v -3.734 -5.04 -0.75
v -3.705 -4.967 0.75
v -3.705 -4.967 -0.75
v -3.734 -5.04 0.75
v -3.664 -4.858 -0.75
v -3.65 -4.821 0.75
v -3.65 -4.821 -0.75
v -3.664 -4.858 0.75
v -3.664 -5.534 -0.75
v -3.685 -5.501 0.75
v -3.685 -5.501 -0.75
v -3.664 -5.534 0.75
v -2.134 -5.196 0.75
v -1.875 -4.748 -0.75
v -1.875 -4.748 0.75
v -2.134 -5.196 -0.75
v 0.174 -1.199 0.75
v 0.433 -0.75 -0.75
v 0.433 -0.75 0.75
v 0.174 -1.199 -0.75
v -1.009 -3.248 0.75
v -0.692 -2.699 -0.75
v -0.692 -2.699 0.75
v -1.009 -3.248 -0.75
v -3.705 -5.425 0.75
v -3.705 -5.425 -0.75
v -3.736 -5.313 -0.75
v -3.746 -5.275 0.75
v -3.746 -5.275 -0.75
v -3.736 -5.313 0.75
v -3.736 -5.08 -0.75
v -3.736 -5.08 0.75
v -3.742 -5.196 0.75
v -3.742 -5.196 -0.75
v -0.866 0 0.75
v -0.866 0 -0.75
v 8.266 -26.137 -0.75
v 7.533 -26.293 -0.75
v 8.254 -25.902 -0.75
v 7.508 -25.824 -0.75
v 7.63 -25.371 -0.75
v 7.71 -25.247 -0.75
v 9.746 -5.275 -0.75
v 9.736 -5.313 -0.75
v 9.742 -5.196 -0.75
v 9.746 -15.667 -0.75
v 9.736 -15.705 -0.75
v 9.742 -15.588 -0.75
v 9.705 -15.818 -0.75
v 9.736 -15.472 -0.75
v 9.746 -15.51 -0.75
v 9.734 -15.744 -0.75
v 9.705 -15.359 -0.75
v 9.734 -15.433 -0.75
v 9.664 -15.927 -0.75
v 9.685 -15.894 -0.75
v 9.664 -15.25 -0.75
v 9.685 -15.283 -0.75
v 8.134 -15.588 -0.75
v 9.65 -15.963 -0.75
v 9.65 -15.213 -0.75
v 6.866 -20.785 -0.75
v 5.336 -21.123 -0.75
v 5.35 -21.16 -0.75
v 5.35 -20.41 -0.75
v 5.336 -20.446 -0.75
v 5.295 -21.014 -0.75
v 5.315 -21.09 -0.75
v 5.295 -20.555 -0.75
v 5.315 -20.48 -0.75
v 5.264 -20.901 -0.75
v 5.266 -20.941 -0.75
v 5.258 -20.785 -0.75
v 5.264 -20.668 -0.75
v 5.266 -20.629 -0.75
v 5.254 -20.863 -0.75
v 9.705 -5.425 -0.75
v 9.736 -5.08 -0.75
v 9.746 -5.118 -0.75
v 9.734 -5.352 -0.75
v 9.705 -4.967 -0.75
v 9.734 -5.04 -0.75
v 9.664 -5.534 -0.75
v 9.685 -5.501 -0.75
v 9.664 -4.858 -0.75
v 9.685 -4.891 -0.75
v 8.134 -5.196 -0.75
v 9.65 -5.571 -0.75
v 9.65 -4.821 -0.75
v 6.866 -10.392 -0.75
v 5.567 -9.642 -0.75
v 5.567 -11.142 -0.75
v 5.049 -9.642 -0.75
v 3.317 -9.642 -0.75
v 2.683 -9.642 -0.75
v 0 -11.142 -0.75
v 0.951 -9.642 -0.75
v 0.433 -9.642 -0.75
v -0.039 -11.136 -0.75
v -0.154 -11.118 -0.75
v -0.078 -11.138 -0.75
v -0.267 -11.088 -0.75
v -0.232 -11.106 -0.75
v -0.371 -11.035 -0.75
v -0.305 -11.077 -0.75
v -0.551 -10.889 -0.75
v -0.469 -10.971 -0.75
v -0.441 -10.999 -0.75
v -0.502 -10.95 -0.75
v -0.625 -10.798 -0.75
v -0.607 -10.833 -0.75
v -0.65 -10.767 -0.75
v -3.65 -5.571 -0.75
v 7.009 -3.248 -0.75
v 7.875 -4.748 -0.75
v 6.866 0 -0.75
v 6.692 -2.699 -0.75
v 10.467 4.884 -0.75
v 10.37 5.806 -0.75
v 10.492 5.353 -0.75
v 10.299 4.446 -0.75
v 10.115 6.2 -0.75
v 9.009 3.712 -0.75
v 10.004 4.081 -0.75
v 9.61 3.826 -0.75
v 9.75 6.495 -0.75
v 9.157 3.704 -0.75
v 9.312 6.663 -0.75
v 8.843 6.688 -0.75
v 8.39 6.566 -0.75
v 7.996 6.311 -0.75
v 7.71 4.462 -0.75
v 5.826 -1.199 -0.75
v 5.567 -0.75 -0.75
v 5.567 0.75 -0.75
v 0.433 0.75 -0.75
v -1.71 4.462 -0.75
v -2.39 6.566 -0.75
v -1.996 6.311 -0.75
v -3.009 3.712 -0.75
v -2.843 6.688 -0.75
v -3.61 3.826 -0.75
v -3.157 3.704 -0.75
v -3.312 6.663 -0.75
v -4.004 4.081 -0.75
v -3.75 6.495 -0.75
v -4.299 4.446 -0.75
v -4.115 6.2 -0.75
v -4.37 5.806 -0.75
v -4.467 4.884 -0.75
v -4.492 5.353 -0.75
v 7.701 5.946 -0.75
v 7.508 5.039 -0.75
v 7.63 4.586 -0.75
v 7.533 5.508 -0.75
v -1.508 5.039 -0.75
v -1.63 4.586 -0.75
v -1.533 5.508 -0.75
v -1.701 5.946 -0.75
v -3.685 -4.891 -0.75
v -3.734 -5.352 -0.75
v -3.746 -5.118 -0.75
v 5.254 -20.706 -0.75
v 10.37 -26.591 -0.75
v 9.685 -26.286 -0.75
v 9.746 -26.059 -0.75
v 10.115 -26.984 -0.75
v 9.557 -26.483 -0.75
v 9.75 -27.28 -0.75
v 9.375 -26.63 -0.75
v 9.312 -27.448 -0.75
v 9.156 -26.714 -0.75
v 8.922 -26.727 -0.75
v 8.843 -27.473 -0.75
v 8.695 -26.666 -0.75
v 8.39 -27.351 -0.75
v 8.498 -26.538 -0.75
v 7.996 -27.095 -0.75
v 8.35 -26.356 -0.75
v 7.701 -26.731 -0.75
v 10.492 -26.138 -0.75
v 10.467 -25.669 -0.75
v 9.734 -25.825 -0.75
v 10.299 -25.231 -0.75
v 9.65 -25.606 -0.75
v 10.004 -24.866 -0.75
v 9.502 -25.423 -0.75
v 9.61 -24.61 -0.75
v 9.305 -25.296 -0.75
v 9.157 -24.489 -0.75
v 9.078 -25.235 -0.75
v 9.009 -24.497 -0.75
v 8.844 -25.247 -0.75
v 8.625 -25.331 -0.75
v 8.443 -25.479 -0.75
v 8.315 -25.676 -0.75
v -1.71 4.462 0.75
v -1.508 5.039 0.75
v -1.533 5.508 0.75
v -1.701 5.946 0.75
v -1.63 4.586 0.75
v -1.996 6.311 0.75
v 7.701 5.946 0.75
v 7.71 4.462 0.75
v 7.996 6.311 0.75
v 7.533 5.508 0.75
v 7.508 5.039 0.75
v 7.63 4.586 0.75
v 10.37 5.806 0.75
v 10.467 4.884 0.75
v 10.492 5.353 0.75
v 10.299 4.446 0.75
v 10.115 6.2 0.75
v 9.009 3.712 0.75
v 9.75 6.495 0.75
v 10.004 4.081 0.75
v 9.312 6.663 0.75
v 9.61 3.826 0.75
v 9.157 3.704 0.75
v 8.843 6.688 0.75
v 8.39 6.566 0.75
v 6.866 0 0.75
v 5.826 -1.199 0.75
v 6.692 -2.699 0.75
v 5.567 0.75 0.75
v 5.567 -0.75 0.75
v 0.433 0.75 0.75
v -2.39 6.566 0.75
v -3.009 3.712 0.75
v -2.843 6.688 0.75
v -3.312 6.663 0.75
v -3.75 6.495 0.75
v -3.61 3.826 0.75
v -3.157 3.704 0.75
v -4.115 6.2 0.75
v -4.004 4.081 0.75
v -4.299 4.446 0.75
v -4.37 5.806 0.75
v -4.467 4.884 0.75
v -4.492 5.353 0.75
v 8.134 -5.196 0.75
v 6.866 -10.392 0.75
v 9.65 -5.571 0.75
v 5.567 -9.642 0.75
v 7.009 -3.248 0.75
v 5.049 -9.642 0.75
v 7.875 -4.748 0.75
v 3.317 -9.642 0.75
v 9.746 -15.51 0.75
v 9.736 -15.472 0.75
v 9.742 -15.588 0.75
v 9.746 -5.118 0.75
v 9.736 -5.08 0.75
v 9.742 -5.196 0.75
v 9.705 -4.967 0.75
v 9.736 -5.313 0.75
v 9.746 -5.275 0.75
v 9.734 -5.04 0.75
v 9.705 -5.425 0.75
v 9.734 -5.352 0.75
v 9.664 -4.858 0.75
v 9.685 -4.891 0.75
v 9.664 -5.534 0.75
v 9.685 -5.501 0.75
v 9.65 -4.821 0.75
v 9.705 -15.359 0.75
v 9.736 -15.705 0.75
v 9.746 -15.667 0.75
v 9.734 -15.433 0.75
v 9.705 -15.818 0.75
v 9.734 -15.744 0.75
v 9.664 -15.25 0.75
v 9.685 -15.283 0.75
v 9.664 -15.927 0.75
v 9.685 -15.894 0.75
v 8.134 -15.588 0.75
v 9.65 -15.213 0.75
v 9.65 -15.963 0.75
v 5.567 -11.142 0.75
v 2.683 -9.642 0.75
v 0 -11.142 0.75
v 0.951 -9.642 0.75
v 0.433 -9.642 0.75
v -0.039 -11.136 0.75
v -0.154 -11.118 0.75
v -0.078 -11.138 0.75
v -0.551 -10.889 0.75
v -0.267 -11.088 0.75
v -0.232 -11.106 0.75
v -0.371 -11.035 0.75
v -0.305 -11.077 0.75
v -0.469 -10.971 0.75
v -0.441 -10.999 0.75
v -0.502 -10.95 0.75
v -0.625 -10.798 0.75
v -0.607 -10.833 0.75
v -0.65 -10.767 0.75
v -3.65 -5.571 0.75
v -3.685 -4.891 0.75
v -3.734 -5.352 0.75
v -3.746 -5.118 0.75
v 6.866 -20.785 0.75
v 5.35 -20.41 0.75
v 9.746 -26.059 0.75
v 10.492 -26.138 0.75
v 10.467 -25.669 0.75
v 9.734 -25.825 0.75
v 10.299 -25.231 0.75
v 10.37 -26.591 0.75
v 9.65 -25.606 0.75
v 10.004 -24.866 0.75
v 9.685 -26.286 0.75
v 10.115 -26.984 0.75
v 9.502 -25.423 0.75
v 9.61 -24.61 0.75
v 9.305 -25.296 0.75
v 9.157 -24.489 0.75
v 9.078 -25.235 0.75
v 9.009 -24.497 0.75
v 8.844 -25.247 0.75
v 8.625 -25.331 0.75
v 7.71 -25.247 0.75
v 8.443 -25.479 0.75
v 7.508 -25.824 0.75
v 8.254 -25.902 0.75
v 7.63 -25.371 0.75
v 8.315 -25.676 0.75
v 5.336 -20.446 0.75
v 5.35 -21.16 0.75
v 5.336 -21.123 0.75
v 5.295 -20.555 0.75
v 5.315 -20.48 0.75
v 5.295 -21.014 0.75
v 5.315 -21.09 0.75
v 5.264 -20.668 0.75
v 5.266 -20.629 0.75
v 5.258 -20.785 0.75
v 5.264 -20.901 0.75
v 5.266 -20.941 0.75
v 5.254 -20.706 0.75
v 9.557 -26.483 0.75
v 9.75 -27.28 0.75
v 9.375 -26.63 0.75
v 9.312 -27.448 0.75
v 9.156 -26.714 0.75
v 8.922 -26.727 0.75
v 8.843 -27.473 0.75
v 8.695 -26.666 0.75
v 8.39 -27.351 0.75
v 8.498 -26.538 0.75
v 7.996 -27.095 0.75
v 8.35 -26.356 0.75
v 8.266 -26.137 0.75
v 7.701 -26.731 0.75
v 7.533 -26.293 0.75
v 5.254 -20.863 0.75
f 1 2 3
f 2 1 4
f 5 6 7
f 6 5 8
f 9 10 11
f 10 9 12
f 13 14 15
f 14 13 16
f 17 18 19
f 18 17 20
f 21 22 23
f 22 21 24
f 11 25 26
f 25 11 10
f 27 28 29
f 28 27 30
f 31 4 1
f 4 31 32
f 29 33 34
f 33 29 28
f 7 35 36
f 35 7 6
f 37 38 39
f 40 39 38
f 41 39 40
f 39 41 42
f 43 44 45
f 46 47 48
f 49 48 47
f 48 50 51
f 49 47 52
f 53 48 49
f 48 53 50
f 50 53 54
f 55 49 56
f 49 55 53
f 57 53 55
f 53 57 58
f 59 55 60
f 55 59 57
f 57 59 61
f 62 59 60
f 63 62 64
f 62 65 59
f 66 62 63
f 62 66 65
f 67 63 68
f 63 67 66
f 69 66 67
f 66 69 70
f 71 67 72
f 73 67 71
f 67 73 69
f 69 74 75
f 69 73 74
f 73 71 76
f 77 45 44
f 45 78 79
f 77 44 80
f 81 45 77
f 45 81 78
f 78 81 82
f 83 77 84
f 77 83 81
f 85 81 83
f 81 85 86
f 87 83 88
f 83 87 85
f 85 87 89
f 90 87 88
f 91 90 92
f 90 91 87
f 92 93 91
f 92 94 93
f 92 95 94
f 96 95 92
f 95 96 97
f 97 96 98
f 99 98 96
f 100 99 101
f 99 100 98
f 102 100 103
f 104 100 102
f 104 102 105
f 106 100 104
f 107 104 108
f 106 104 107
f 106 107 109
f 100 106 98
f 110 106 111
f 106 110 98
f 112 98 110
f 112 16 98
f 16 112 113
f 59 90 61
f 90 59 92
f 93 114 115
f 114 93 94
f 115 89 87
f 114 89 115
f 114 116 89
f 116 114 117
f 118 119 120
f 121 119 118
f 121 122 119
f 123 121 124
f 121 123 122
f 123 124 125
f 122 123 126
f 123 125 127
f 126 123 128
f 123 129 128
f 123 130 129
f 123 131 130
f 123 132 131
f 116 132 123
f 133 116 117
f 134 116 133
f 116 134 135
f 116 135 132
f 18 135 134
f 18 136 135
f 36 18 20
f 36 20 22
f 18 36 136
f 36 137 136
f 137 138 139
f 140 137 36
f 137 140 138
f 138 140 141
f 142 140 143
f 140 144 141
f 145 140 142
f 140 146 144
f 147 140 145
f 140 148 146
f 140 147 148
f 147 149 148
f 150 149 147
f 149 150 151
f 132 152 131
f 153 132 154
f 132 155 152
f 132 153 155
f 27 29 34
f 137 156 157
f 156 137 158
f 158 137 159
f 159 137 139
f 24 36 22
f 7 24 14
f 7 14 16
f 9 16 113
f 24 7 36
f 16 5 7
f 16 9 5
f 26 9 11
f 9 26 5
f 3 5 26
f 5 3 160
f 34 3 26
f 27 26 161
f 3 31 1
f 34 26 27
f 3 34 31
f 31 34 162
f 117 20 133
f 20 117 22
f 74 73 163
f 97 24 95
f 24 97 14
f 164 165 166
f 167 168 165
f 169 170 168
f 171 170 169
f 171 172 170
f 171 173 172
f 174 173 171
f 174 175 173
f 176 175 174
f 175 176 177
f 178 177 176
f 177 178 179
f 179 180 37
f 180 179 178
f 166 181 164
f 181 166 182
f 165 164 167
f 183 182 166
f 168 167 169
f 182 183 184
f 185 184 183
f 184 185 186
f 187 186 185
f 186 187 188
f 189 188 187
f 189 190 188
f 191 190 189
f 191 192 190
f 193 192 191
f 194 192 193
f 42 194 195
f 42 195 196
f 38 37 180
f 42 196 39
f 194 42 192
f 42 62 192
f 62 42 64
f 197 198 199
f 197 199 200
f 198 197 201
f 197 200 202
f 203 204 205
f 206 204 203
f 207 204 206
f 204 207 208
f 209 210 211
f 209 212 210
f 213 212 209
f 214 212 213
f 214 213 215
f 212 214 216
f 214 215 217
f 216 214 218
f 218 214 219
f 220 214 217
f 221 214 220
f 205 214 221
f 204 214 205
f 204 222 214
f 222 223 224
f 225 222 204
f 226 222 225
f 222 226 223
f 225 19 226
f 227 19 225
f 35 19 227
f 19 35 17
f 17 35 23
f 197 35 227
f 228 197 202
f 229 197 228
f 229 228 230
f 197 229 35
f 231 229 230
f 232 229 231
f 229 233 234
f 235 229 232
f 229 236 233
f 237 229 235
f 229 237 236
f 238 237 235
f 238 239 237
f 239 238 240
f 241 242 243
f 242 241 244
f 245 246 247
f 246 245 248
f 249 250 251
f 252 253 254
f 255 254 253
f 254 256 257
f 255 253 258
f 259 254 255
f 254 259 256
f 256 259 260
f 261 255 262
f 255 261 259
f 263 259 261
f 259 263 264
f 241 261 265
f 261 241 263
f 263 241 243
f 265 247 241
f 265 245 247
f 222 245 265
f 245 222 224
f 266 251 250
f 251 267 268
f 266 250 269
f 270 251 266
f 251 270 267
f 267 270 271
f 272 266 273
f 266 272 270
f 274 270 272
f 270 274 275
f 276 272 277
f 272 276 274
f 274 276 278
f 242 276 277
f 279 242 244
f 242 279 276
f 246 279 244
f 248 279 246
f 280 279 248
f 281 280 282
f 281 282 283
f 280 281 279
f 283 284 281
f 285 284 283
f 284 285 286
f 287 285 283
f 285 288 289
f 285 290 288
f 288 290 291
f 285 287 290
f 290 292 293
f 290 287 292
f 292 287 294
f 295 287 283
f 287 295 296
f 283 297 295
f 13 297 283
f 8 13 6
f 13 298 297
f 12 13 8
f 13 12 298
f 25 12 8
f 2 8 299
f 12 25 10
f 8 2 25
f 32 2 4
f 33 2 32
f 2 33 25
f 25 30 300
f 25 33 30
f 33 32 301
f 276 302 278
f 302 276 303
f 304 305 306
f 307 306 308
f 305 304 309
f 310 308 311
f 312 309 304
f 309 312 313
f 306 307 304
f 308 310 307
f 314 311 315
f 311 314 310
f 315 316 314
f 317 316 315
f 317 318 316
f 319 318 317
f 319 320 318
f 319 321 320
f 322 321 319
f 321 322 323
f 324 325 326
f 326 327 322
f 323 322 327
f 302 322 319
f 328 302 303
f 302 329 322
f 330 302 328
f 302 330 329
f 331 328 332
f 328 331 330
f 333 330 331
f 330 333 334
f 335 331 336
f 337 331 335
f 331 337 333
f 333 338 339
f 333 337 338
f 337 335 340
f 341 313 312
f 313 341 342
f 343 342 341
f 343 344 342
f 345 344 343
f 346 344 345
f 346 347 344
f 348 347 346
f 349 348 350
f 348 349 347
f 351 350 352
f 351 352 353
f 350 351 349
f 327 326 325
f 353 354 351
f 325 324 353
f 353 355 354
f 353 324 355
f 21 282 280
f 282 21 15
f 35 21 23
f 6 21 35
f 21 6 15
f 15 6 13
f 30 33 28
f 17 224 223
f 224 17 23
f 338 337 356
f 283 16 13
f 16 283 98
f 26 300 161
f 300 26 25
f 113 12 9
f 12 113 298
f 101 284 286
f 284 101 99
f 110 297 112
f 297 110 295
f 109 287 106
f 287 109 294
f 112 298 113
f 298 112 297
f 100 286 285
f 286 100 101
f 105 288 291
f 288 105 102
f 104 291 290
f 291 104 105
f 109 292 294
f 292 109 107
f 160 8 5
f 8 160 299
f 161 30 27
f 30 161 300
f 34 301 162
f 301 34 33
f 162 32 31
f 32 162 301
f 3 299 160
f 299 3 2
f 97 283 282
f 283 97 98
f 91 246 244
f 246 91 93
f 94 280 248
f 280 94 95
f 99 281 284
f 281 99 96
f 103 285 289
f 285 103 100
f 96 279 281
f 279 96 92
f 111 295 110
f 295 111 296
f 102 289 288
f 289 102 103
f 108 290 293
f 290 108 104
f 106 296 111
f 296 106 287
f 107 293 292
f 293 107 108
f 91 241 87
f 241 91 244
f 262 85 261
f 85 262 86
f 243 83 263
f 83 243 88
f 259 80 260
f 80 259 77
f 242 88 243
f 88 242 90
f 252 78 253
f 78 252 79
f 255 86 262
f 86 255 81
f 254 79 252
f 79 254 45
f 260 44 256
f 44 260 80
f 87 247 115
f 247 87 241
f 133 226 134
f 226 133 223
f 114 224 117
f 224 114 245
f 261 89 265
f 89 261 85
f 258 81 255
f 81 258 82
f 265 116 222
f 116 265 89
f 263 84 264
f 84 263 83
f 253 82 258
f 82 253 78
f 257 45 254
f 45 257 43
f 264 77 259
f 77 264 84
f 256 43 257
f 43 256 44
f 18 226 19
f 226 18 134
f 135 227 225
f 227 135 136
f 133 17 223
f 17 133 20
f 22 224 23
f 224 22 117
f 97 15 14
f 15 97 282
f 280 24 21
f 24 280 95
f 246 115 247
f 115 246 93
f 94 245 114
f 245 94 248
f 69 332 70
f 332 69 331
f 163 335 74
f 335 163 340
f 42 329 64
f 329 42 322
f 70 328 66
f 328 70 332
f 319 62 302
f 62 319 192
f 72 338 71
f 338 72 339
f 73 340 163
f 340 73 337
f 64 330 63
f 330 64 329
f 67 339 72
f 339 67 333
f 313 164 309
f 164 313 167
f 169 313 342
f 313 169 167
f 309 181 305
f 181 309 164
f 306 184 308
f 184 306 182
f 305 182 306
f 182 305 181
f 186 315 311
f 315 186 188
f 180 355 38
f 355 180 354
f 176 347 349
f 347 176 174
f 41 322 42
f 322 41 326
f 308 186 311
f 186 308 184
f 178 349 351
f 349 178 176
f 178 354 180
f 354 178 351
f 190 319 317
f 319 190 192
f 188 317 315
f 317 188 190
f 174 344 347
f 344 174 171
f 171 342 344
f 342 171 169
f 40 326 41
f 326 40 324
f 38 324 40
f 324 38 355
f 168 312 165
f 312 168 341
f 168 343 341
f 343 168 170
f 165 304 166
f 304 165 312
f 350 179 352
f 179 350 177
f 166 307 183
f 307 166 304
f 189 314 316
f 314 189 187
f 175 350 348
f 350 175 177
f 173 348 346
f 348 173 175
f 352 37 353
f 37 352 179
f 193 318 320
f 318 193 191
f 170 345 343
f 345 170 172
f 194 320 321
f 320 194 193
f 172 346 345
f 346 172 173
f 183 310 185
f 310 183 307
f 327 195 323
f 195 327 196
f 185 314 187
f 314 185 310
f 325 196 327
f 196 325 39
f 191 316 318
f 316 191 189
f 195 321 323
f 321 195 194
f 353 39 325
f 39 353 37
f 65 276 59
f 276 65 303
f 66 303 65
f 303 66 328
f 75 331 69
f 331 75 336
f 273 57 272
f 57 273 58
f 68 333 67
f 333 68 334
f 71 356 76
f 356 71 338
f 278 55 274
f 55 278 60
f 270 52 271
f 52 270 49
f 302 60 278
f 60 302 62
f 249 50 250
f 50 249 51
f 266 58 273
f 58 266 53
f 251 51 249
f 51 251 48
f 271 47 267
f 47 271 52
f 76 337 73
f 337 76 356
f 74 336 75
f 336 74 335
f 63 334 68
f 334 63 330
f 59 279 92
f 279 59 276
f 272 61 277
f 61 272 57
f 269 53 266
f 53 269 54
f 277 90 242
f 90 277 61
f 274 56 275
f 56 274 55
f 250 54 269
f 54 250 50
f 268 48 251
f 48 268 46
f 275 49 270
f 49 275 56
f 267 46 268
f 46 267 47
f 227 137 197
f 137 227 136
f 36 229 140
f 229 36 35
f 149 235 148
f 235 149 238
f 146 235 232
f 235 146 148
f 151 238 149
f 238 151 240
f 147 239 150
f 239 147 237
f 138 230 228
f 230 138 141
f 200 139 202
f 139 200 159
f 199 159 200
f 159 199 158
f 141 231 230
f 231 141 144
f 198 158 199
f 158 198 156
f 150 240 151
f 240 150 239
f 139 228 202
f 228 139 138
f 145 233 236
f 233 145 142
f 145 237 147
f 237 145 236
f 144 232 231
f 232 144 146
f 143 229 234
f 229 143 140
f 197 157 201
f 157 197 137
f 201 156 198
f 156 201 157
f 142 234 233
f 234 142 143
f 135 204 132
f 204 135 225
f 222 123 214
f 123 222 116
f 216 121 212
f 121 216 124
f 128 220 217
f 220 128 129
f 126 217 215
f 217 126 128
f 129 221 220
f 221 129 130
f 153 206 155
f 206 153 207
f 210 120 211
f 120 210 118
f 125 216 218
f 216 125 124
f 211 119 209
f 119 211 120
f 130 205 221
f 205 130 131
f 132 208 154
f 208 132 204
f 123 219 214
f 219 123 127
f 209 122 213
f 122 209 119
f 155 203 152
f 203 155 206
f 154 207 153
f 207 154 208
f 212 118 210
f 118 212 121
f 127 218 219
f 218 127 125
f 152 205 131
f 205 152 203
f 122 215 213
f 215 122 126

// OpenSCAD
$fn=20;

module bond(a=1, length=10){
    hull(){
        cylinder(d=a,h=a,center=true);
        translate([length,0,0]) cylinder(d=a,h=a,center=true);
    }
}

module cyclohexan(a=1,length=10){
    _recursiveBond(a,length,0,6,-60);
}

module _recursiveBond(a,length,counter,iterations,angle){
    if(counter < iterations){
        translate([length,0,0]) rotate([0,0,angle]) _recursiveBond(a,length,counter+1,iterations,angle);
        bond(a,length);
    }
}

module benzen(a=1,length=10){
    cyclohexan(a,length);
    translate([length,0,0]) rotate([0,0,-60]) _recursiveBondEven(a,length,0,3,-60);
}

module _recursiveBondEven(a,length,counter,iterations,angle,const=1.5){
    if(counter < iterations){
        translate([length,0,0])
            rotate([0,0,angle])
                translate([length,0,0])
                    rotate([0,0,angle])
                        _recursiveBondEven(a,length,counter+1,iterations,angle);
    }
    
    translate([length-const*a,0,0]) rotate([0,0,angle]) bond(a,length+const*a);   
}

module nChain(a=1,length=10,carbons){
    _recursiveChain(a,length,0,carbons,-60) {children(0); children(1);};
}

module _recursiveChain(a,length,counter,iterations,angle) {
    if(counter < iterations){
        translate([length,0,0]) rotate([0,0,pow(-1,counter)*angle]) _recursiveChain(a,length,counter+1,iterations,angle) {children(0);children(1);};
        if(counter==(iterations-1)){
            difference(){
                bond(a,length);
                translate([length,0,0]) children(0);
                }
            translate([length,0,0]) children(1);
        } else {
            bond(a,length);
        }
    }
}

module dopamine(a=1,length=10){
    benzen(a,length);
    rotate([0,0,120]) bond(a,length);
    rotate([0,0,120]) translate([length,0,0]) cylinder(r=a,h=a,center=true);
    translate([length,0,0]) rotate([0,0,60]) bond(a,length);
    translate([length,0,0]) rotate([0,0,60]) translate([length,0,0]) cylinder(r=a,h=a,center=true);
    translate([length,0,0]) rotate([0,0,-60]) translate([length,0,0]) rotate([0,0,-60]) translate([length,0,0]) rotate([0,0,60])
    nChain(a,length,3){
        cylinder(d=1.75*a,h=a,center=true);
        difference(){
            cylinder(r=a,h=a,center=true);
            cylinder(d=a,h=2*a,center=true);
        };
    }
}


dopamine(a=1.5,length=6);
